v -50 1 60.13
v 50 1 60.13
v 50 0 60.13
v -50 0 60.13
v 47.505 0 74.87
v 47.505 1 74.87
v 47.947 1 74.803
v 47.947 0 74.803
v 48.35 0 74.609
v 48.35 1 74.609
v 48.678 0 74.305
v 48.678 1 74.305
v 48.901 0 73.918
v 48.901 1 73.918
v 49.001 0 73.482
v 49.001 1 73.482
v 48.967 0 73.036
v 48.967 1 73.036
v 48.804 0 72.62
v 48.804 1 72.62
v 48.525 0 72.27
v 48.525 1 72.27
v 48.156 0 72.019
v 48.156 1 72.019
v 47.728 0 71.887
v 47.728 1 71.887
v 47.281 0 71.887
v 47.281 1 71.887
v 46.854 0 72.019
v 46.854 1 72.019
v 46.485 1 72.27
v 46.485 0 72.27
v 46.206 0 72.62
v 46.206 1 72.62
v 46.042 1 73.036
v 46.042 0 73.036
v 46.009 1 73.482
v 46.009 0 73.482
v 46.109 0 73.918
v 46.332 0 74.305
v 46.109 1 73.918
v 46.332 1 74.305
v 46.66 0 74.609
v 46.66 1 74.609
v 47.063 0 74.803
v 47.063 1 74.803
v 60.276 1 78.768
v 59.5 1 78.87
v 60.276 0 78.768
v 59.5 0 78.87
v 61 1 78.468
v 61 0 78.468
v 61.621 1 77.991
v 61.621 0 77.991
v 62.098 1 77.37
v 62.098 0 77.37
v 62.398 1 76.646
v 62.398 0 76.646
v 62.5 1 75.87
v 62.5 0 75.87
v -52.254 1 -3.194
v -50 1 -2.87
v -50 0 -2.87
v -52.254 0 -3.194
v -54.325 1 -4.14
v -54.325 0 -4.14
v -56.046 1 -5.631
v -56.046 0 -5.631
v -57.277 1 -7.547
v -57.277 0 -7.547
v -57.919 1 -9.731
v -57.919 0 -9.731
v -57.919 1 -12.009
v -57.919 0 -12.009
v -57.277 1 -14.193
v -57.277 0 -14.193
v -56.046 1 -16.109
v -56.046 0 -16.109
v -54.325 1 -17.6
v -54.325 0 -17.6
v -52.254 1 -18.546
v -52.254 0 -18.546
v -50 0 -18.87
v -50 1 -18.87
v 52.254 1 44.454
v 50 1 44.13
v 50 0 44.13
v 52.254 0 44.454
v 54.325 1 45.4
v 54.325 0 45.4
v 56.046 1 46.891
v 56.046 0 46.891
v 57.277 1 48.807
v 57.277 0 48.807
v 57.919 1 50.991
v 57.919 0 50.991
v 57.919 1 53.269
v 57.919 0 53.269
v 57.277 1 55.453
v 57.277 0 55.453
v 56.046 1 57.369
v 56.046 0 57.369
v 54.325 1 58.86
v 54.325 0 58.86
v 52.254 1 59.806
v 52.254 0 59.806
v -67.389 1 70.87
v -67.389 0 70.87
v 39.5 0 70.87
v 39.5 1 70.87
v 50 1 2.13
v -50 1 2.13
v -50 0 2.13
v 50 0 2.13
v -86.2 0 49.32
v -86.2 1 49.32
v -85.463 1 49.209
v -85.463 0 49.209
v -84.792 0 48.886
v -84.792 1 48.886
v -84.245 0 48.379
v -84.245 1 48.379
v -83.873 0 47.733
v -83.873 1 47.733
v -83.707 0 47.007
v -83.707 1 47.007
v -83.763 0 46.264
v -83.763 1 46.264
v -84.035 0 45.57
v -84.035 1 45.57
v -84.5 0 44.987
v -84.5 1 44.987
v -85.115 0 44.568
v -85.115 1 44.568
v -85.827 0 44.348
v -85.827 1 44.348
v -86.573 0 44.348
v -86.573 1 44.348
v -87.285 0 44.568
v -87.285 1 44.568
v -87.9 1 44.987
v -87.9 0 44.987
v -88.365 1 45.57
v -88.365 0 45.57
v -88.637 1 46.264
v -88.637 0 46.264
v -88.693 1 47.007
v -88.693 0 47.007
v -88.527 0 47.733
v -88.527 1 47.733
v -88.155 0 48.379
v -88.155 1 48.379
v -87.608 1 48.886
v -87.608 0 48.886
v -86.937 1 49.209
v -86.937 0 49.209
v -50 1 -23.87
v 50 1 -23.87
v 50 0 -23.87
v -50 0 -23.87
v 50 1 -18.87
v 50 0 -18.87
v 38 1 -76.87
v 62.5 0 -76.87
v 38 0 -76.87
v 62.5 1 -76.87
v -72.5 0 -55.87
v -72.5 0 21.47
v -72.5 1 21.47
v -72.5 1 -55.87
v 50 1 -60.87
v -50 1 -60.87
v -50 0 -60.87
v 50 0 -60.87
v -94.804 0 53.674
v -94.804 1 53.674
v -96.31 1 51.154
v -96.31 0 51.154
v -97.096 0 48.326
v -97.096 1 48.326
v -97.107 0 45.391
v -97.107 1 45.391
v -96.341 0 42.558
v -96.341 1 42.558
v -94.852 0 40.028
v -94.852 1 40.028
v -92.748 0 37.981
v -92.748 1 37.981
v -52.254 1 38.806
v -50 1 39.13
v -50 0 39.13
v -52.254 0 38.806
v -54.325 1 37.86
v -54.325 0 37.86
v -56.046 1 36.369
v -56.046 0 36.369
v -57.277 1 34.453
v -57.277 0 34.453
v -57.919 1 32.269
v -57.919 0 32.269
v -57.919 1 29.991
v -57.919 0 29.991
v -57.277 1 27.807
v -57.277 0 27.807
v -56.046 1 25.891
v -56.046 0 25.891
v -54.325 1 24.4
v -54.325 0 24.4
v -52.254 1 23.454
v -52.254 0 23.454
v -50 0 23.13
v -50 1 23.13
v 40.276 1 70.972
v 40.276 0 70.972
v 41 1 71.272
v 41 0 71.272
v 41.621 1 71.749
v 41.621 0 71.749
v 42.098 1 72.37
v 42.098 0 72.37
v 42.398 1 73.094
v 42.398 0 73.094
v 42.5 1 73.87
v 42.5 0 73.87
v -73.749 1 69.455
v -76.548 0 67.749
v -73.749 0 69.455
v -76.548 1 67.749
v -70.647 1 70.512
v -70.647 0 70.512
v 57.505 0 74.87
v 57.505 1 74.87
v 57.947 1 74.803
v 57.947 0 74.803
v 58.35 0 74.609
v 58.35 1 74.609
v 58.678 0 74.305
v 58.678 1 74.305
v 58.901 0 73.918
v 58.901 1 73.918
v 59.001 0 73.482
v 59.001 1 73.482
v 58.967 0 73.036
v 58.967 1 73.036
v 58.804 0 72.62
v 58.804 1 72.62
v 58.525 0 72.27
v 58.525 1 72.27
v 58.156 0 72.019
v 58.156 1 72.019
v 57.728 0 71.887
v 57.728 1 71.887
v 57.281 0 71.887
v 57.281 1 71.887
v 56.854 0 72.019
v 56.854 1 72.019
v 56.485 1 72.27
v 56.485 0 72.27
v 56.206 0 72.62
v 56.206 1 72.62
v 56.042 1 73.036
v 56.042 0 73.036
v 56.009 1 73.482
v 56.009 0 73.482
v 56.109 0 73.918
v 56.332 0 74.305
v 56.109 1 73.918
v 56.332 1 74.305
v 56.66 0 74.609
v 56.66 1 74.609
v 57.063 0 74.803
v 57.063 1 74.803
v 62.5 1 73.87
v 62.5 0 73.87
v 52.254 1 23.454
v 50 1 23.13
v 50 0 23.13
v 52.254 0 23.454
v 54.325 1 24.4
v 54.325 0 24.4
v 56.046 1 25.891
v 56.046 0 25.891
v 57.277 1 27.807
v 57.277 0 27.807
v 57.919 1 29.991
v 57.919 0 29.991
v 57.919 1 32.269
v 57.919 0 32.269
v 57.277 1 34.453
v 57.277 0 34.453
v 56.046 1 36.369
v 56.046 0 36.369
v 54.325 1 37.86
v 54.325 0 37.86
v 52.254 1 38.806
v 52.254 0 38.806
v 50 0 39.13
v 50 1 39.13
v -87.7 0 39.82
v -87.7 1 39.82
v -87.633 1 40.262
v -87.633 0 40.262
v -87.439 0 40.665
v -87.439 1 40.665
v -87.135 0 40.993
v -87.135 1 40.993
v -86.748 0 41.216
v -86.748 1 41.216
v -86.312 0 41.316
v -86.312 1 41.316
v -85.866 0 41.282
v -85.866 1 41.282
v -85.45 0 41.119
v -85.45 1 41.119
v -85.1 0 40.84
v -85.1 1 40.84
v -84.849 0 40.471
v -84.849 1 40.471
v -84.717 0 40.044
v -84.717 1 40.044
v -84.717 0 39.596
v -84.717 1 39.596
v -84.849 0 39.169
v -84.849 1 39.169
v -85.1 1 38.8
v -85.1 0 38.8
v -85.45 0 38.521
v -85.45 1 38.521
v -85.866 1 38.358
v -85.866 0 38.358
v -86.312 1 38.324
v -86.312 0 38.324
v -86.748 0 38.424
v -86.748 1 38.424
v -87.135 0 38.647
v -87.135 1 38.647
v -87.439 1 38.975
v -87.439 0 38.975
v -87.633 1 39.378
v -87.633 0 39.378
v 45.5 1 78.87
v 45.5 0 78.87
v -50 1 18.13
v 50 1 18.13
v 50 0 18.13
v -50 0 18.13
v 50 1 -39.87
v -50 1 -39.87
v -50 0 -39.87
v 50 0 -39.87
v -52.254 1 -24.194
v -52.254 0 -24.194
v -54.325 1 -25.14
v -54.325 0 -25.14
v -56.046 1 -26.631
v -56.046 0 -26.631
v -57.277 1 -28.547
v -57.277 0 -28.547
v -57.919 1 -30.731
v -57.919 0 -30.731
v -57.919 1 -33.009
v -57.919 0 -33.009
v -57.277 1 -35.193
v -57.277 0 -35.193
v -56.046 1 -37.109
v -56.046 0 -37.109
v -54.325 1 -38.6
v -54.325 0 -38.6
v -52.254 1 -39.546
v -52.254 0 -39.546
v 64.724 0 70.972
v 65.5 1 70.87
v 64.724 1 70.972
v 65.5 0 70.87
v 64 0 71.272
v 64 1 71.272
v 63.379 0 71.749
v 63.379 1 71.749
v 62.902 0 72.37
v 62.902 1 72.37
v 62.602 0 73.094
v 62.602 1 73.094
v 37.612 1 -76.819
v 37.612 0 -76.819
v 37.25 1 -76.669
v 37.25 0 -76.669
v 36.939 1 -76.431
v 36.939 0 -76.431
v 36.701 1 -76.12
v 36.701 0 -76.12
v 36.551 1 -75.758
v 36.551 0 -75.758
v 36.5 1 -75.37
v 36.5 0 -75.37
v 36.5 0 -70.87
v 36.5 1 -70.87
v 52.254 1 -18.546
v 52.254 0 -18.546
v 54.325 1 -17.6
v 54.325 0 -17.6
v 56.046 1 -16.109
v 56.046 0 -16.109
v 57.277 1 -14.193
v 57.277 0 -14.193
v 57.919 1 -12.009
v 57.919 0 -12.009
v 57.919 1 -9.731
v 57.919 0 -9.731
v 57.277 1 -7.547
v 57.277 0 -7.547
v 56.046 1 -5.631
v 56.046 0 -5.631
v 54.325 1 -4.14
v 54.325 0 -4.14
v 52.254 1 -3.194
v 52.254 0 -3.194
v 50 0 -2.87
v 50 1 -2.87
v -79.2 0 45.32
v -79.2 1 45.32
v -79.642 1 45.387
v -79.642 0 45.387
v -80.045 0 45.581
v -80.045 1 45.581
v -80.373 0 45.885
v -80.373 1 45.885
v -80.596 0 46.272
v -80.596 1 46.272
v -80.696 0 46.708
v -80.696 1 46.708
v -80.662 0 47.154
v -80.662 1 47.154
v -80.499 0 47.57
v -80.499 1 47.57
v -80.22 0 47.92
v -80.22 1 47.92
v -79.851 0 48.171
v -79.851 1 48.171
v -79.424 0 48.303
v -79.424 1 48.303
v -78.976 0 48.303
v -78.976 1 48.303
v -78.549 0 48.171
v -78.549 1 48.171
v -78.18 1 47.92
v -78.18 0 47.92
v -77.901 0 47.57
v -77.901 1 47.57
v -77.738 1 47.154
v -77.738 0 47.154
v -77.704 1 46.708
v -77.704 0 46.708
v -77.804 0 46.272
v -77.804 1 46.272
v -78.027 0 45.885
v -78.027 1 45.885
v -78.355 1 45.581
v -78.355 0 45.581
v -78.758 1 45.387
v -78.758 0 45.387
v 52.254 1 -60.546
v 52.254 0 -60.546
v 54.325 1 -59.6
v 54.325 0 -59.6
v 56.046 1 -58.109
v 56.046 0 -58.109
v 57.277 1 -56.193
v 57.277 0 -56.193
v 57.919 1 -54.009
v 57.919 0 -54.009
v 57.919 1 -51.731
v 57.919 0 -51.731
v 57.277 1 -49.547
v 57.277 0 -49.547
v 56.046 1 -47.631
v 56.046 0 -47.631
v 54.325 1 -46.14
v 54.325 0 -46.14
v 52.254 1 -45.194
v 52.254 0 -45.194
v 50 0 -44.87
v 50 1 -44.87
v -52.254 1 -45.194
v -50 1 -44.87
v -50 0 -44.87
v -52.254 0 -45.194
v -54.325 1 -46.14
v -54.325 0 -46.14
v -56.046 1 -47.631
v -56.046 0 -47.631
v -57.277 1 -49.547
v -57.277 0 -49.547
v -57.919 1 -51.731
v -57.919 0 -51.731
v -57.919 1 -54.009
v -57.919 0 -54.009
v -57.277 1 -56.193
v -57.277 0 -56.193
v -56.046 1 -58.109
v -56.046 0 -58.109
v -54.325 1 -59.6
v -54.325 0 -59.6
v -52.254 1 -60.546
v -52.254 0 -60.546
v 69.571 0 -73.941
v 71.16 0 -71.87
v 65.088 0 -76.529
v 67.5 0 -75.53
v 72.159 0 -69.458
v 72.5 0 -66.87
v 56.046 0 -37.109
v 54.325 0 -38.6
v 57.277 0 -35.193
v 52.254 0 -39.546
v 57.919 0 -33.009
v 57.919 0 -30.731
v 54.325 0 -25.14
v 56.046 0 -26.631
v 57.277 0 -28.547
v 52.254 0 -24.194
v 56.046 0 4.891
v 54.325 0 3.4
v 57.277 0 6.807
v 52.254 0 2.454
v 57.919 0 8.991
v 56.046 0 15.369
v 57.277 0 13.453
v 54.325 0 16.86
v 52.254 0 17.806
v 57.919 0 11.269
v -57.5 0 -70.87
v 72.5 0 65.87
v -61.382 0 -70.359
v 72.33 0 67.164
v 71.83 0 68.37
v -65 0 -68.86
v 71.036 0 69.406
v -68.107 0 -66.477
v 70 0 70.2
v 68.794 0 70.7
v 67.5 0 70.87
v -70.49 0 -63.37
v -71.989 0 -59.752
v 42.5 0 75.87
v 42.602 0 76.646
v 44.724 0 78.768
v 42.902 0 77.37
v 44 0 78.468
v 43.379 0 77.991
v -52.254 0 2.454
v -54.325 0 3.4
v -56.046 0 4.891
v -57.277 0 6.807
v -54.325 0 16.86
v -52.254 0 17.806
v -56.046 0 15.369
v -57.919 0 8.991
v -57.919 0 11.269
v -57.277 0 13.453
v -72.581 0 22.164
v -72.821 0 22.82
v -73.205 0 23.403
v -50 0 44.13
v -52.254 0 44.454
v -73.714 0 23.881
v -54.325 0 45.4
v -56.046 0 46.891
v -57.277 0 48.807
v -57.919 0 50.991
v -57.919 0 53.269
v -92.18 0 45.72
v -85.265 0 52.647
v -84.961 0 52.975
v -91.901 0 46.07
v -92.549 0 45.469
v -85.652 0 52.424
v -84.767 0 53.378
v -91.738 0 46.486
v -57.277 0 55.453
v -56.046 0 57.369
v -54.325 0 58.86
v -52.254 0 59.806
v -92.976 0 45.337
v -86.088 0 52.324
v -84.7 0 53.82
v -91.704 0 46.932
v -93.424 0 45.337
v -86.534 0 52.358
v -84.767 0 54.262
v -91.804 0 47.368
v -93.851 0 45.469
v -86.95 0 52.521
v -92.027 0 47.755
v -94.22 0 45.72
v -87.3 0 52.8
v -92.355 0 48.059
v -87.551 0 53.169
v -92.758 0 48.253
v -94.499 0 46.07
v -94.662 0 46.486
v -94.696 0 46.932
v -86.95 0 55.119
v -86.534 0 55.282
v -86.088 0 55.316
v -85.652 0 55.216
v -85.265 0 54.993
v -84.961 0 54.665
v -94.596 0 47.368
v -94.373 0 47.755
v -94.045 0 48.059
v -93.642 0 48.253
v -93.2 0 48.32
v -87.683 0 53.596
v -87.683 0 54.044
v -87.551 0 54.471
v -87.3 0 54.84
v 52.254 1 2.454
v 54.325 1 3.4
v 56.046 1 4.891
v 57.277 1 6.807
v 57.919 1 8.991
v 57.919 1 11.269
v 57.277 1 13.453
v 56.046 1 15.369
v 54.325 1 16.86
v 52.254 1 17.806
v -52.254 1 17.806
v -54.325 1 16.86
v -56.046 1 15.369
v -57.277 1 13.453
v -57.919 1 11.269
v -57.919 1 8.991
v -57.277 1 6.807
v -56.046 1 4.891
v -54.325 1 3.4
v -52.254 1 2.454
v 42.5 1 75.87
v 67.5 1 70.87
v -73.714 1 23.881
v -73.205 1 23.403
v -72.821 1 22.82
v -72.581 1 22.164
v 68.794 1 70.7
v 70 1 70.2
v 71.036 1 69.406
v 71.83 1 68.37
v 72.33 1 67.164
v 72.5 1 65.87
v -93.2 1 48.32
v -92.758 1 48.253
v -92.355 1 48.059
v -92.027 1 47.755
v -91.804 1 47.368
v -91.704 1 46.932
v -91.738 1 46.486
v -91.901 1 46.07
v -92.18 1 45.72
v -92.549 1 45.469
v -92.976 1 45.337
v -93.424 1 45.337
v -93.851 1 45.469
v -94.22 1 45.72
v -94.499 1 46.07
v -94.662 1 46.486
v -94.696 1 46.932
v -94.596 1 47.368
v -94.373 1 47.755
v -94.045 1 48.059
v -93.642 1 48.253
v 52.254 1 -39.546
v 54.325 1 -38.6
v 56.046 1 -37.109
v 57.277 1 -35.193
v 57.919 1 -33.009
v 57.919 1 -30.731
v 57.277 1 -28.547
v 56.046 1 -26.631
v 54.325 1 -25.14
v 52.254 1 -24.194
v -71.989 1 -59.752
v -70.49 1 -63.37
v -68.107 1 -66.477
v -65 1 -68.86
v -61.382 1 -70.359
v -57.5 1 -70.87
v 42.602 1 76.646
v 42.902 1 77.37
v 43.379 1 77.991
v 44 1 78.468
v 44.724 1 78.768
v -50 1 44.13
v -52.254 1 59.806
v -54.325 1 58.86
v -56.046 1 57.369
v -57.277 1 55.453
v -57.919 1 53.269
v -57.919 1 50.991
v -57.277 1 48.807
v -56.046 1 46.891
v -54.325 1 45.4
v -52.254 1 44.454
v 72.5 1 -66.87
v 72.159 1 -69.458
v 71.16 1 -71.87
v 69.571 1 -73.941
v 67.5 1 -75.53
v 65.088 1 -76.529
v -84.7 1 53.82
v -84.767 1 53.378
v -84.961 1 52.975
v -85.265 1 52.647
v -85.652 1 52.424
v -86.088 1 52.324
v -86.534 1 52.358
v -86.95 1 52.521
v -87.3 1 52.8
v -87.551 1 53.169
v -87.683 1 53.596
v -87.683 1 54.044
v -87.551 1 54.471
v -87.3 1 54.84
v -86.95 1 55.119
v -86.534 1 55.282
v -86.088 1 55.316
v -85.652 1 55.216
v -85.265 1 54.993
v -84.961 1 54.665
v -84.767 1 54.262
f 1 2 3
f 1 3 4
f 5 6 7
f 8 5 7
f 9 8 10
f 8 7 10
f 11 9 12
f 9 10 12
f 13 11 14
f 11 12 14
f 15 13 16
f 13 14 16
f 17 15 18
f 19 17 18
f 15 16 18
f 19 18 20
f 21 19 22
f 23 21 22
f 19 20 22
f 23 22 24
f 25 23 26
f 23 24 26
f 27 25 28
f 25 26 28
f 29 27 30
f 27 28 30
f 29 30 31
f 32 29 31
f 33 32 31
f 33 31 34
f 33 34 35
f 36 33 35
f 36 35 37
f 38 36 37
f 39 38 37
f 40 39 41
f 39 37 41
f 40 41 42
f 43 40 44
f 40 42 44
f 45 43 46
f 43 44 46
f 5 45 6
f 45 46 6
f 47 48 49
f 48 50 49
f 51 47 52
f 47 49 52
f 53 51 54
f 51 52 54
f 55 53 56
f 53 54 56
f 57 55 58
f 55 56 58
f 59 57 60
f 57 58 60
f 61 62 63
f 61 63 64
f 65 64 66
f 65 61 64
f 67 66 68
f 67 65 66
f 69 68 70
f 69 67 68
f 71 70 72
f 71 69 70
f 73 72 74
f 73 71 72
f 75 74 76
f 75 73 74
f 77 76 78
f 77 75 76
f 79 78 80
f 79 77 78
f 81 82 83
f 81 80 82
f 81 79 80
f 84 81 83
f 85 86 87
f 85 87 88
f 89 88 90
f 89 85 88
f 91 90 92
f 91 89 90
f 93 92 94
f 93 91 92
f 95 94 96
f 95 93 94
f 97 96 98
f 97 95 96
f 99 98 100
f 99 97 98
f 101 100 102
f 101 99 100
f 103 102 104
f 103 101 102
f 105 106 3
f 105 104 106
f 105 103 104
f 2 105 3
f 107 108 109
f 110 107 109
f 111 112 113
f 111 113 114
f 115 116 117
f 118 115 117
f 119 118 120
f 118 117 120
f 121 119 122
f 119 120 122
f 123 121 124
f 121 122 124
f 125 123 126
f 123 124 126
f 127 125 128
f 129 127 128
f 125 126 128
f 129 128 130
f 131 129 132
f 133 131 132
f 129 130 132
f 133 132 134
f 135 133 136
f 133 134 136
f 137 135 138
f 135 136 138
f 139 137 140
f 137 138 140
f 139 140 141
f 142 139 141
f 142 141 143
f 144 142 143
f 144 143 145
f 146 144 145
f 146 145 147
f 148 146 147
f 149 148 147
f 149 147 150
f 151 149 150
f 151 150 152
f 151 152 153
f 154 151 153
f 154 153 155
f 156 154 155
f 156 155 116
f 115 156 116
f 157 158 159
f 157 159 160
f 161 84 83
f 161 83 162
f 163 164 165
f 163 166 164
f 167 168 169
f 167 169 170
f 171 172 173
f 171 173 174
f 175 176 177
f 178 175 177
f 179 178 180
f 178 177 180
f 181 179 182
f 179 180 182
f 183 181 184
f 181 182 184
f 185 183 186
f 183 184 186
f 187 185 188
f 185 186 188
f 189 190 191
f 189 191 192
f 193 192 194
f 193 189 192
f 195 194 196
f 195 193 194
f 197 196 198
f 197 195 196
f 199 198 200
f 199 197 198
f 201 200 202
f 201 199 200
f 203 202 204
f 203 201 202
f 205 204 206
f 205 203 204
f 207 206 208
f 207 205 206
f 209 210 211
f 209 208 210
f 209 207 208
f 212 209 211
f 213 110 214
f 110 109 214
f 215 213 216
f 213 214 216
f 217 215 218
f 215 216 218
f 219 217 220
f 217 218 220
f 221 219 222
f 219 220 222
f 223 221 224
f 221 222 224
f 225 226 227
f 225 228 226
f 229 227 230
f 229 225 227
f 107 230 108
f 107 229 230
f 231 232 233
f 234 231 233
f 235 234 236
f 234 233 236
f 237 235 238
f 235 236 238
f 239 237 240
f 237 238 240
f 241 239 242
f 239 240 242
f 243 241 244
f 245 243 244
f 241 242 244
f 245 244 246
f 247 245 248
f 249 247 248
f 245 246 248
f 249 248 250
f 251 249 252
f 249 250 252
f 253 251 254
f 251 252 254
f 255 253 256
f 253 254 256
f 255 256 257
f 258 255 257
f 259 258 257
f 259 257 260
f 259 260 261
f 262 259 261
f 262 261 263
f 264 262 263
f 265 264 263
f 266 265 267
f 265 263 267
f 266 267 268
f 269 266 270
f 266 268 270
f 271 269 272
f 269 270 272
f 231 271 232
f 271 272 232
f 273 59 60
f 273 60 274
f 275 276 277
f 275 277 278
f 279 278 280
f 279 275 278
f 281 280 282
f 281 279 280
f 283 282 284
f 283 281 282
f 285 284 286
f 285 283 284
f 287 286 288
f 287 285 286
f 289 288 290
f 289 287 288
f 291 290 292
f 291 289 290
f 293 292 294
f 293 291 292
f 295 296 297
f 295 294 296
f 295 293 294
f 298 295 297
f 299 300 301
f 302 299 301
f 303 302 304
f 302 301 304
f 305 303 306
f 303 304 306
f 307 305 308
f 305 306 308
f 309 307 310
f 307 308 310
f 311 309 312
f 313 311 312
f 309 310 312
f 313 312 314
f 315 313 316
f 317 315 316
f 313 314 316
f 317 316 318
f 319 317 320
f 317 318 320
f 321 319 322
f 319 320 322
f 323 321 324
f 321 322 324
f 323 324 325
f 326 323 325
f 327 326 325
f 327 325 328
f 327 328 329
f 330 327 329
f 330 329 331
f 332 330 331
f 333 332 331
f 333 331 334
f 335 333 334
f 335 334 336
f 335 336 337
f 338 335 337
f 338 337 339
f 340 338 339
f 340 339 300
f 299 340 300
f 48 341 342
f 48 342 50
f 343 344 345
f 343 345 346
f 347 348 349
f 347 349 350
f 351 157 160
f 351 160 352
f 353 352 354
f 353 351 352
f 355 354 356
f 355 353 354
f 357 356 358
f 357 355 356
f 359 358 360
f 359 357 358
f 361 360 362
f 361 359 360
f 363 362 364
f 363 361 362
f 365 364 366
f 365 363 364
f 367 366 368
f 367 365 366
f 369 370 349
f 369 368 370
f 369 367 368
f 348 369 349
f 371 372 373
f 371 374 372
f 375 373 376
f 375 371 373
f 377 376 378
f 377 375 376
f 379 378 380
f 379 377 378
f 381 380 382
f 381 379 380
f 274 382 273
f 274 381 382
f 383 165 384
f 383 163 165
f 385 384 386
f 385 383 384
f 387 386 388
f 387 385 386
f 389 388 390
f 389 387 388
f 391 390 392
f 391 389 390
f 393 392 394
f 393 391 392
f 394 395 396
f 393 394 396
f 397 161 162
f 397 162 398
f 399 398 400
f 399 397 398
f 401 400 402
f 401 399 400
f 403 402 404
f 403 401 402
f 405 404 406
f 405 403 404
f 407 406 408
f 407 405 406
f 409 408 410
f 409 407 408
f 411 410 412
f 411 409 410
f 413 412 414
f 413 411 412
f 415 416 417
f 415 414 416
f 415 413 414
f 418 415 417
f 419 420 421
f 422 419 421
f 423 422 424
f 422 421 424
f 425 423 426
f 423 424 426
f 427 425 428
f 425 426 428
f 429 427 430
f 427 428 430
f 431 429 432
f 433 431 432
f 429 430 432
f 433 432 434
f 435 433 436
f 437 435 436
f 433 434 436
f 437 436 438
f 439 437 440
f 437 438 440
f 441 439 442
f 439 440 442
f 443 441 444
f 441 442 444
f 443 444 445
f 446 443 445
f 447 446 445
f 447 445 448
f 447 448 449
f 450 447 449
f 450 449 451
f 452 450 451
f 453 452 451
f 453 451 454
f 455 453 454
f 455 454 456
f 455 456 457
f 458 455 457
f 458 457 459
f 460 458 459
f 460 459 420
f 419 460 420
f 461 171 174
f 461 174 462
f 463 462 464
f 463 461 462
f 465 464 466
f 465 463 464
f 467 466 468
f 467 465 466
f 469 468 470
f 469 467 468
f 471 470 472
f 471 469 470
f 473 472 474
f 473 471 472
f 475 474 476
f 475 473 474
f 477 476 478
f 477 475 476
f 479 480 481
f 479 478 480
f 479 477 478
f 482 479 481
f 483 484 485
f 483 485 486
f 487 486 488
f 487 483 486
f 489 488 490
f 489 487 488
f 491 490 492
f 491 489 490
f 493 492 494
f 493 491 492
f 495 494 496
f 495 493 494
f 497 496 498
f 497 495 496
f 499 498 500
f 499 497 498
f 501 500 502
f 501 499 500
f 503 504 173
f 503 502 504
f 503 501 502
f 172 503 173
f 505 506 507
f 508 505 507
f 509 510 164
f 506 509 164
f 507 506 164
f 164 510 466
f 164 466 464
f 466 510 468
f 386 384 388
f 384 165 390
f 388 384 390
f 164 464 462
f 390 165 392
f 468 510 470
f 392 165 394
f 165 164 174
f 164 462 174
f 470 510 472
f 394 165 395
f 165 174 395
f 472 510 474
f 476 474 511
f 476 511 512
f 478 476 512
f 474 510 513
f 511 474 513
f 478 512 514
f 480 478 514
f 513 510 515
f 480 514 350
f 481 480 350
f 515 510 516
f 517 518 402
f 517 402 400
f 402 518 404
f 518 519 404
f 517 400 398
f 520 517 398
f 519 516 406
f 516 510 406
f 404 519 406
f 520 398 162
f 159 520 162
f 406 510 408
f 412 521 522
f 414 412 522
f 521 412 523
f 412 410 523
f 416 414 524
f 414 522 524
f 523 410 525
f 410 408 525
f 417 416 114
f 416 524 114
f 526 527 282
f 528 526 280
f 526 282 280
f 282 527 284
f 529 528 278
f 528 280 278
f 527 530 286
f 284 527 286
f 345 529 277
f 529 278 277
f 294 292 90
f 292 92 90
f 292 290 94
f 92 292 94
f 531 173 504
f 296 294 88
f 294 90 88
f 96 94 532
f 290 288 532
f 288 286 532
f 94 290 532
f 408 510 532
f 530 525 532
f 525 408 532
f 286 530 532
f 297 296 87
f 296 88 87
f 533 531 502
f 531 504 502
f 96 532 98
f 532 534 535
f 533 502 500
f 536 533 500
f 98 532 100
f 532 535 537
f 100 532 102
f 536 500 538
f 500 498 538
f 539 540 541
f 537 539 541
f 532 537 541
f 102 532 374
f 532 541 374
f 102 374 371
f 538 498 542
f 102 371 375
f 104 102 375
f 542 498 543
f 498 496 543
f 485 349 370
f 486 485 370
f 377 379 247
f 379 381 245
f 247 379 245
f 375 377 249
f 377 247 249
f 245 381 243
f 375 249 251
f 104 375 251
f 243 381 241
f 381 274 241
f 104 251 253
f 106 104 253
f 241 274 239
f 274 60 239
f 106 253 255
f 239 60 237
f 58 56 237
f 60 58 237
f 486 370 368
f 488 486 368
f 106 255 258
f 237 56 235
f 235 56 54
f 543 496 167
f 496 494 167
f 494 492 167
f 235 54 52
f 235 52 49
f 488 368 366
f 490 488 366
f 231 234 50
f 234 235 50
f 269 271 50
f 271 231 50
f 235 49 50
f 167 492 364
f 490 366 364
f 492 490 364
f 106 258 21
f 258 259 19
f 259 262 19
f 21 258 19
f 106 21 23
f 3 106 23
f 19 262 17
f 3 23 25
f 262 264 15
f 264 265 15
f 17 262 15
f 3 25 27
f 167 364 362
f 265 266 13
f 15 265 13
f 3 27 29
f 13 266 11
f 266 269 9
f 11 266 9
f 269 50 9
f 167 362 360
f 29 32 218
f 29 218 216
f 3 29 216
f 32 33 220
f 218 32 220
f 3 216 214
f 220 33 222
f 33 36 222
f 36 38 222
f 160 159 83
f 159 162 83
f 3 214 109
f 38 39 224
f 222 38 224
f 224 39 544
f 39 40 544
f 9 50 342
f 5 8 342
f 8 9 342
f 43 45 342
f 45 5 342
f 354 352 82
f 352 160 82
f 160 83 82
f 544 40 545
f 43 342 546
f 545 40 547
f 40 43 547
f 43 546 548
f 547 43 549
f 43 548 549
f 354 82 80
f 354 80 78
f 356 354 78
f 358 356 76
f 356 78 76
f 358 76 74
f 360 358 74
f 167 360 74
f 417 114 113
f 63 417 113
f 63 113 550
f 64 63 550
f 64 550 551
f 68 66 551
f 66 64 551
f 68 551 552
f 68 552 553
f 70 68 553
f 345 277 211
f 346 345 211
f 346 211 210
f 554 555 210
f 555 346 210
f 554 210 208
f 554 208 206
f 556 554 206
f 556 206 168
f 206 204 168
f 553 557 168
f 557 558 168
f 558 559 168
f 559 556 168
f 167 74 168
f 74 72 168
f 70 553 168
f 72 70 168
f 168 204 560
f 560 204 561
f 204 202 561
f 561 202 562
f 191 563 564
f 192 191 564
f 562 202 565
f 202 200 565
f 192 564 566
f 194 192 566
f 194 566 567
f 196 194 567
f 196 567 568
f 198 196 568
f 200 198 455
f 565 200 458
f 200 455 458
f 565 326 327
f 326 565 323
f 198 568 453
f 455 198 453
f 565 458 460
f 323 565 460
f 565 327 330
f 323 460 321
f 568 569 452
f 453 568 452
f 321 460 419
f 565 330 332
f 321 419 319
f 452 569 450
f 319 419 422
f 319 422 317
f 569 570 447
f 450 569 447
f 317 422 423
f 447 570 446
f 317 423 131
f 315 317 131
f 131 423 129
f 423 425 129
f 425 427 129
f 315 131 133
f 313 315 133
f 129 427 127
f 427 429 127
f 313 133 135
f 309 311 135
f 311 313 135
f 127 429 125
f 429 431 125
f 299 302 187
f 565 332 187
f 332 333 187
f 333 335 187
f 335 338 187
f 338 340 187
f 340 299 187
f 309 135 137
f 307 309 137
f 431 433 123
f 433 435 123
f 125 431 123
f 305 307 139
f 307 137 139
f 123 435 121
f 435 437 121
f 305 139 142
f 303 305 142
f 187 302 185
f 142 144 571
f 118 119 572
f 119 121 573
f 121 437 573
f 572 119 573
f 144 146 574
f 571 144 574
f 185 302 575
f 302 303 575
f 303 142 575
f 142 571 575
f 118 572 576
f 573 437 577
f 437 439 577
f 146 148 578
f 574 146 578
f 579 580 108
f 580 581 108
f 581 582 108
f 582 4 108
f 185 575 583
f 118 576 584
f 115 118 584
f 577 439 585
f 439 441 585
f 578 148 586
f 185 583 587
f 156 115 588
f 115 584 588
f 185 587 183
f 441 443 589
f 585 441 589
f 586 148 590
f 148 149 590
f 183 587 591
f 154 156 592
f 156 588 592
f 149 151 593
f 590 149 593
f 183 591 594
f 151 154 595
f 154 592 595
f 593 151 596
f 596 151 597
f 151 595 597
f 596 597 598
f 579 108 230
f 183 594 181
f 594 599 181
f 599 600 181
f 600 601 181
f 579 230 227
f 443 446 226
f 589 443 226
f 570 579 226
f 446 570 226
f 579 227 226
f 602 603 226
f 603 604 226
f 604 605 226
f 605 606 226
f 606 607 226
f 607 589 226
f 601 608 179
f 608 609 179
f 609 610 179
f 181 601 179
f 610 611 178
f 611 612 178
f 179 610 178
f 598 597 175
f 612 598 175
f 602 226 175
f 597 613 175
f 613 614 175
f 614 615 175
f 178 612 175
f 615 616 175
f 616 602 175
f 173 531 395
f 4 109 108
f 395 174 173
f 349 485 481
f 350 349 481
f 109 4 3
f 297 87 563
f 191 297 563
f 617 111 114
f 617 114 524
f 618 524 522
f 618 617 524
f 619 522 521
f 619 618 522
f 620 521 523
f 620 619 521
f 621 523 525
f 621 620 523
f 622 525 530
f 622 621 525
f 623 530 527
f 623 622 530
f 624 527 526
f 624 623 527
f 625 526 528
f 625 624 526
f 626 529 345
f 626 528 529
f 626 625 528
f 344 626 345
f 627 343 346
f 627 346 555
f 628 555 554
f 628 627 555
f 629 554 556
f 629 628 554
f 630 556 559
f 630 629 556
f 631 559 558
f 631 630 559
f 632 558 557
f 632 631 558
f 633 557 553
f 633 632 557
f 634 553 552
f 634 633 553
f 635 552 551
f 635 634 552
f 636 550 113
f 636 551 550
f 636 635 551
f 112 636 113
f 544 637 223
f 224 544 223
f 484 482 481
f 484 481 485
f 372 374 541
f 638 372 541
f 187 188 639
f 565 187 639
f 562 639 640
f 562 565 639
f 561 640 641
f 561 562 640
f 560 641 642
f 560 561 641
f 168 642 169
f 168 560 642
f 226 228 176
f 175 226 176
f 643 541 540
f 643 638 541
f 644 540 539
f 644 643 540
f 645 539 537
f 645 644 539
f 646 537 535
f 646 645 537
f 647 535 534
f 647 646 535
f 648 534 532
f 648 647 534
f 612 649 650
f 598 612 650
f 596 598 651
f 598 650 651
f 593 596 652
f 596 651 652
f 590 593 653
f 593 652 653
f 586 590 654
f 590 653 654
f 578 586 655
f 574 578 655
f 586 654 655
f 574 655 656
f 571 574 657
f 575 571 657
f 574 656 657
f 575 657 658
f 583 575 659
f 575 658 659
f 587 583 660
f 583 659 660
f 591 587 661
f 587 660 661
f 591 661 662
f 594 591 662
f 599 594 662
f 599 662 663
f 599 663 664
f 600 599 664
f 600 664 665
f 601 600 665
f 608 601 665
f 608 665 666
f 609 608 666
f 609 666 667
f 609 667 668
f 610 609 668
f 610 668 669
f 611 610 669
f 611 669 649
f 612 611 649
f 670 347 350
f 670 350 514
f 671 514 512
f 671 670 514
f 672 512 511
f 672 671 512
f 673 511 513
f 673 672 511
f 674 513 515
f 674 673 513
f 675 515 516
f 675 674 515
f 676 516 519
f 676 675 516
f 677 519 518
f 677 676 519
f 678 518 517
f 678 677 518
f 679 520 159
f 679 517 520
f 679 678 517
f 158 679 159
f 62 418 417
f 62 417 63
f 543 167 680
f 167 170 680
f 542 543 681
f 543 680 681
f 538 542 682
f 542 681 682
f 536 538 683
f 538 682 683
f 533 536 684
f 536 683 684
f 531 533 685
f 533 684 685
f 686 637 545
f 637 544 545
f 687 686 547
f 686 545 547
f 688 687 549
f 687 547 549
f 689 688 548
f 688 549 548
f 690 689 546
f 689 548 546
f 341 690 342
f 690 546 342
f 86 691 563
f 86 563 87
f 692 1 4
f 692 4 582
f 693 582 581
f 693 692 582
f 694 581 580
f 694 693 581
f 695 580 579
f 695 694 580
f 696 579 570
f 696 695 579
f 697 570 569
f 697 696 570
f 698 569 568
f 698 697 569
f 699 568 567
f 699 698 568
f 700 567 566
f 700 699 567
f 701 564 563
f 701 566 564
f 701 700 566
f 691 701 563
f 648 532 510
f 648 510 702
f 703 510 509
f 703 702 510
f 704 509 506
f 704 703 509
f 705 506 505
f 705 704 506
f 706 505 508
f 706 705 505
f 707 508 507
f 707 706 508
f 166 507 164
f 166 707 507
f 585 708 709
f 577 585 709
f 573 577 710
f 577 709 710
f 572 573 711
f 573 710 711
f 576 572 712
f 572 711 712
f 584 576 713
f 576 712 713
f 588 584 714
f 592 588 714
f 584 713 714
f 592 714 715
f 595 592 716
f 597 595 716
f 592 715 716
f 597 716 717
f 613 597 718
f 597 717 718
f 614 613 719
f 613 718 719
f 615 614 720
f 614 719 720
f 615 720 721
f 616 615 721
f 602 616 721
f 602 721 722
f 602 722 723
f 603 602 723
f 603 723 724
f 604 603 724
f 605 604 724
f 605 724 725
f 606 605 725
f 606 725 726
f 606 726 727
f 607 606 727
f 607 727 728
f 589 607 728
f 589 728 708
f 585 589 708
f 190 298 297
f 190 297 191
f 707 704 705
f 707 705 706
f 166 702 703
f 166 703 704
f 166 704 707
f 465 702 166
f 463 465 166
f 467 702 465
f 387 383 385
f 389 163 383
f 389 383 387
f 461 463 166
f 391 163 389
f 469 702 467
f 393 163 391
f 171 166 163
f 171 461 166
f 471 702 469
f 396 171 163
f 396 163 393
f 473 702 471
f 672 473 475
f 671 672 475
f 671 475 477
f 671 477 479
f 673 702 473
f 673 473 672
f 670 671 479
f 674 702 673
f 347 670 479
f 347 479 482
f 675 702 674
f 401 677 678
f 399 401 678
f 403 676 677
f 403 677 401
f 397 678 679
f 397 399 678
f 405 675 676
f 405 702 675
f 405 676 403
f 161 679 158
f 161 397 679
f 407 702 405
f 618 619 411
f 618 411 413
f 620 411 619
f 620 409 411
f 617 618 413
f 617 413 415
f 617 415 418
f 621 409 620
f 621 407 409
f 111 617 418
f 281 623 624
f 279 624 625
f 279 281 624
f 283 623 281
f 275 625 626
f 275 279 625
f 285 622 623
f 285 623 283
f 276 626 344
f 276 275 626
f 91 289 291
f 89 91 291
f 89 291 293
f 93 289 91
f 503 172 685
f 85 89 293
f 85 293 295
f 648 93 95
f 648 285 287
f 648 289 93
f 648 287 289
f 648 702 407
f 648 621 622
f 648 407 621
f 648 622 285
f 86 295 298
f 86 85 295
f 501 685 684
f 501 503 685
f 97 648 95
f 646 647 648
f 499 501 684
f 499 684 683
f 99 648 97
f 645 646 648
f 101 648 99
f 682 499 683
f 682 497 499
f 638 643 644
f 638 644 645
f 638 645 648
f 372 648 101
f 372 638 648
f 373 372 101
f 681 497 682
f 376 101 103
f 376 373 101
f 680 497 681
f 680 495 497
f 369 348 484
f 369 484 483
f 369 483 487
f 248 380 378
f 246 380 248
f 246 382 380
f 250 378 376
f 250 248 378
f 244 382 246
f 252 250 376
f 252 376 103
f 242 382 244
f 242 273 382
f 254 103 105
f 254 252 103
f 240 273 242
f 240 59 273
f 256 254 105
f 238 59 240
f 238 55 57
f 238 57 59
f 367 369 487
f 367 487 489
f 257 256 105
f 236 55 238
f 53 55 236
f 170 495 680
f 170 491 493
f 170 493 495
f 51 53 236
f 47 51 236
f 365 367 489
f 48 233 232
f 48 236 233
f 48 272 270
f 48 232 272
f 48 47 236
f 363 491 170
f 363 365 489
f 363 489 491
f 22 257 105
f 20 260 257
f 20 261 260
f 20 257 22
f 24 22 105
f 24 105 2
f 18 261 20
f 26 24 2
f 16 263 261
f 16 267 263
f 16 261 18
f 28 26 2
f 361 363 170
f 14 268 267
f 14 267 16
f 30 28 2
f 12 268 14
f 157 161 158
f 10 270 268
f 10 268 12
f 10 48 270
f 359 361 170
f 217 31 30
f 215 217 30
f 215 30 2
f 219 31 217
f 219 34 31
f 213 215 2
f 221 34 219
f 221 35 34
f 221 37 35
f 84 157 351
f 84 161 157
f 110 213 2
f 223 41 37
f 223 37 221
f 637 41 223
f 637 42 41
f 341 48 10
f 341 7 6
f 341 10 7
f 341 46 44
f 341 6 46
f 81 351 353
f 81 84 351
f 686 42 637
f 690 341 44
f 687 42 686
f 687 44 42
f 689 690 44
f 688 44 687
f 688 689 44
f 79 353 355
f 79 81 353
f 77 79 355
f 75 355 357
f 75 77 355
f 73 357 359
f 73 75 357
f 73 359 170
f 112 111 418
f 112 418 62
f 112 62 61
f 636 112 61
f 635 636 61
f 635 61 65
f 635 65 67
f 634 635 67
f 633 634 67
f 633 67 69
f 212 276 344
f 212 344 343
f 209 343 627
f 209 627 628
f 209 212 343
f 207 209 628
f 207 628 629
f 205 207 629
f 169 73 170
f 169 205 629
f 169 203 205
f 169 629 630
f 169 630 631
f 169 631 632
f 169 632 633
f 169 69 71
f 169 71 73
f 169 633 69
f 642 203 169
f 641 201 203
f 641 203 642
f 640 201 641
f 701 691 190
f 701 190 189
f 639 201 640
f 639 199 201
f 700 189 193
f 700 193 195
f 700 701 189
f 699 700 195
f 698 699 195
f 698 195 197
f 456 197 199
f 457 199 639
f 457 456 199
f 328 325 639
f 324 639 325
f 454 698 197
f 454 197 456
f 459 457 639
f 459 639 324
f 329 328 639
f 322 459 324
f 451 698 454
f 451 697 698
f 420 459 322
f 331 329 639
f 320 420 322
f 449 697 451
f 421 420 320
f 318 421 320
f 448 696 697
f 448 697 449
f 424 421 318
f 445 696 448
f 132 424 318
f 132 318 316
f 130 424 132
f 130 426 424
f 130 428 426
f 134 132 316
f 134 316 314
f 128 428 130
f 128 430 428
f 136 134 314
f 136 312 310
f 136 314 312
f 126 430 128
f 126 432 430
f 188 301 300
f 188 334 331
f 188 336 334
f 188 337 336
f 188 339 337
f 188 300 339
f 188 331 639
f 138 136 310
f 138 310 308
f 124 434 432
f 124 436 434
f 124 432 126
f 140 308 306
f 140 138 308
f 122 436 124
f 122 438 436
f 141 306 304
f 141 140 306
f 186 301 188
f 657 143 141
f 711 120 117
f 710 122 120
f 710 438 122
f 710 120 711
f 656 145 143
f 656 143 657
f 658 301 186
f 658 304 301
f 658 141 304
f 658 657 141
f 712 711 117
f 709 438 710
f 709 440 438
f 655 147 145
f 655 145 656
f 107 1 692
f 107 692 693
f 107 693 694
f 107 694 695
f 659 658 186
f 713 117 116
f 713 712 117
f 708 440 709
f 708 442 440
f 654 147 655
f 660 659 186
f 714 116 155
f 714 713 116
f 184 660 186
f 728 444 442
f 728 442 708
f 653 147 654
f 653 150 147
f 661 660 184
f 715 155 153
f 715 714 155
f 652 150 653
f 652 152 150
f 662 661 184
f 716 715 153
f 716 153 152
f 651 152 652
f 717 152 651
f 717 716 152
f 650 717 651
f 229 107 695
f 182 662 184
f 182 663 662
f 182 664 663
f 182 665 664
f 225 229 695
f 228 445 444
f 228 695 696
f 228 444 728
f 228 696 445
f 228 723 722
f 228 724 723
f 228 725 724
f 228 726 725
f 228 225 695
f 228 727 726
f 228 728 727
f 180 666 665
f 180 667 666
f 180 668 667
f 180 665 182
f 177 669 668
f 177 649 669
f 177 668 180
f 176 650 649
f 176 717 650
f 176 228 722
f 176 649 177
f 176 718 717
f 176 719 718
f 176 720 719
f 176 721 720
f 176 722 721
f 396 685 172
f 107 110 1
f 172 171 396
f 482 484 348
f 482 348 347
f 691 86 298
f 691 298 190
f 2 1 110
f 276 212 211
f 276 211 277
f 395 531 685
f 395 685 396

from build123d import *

# Parameters (mm, degrees)
SKETCH_1_W               = 145
SKETCH_1_H               = 141.74
EXTRUDE_1_DEPTH          = 1
FILLET_1_R               = 15
EXTRUDE_2_DEPTH          = 1
SKETCH_3_R               = 2.5
SKETCH_3_R_2             = 1.5
CUT_EXTRUDE_1_DEPTH      = 127.962285976
PATTERN_CIRCULAR_1_COUNT = 4
CUT_EXTRUDE_2_DEPTH      = 127.962285976
FILLET_2_R               = 15
FILLET_3_R               = 3
CUT_EXTRUDE_3_DEPTH      = 121.297119251
SKETCH_6_W               = 36
SKETCH_6_H               = 1
EXTRUDE_3_DEPTH          = 6
FILLET_4_R               = 10
FILLET_5_R               = 1.5
SKETCH_8_W               = 20
SKETCH_8_H               = 8
SKETCH_8_R               = 1.5
EXTRUDE_5_DEPTH          = 1
FILLET_8_R               = 3
FILLET_9_R               = 5


with BuildPart() as part:
    # 草图1 → 凸台-拉伸1 (new body)
    with BuildSketch(Plane(origin=(0, 0, 0), x_dir=(1, 0, 0), z_dir=(0, 1, 0))):
        Rectangle(SKETCH_1_W, SKETCH_1_H)
    extrude(amount=EXTRUDE_1_DEPTH)

    # 圆角1
    fillet_1_edges = [part.edges().sort_by_distance(p)[0] for p in [
        (-72.5, 0.5, -70.87),
    ]]
    fillet(fillet_1_edges, radius=FILLET_1_R)

    # 草图2 → 凸台-拉伸2 (add)
    with BuildSketch(Plane(origin=(0, 1, 0), x_dir=(1, 0, 0), z_dir=(0, 1, 0))):
        with BuildLine():
            Line((-92.747934341, -37.981190359), (-72.5, -22.981190359))
            Line((-72.5, -22.981190359), (-72.5, -81.673631364))
            Line((-72.5, -81.673631364), (-94.803937304, -53.673631364))
            ThreePointArc((-94.803937304, -53.673631364), (-97.10678595, -45.391007263), (-92.747934341, -37.981190359))
        make_face()
    extrude(amount=-EXTRUDE_2_DEPTH)

    # 草图3 → 切除-拉伸1 (cut, through all)
    with BuildSketch(Plane(origin=(0, 1, 0), x_dir=(1, 0, 0), z_dir=(0, 1, 0))):
        with Locations(Location((-86.2, -46.82, 0), (0, 0, 270))):
            Circle(SKETCH_3_R)
        with Locations(Location((-93.2, -46.82, 0), (0, 0, 270))):
            Circle(SKETCH_3_R_2)
    cut_extrude_1 = extrude(amount=-CUT_EXTRUDE_1_DEPTH, mode=Mode.SUBTRACT)

    # 阵列(圆周)1: 切除-拉伸1 ×4 about axis
    pattern_circular_1_axis = Axis((-86.2, 0, 46.82), (0, 1, 0))
    for i in range(1, PATTERN_CIRCULAR_1_COUNT):
        add(cut_extrude_1.rotate(pattern_circular_1_axis, i * 360 / PATTERN_CIRCULAR_1_COUNT), mode=Mode.SUBTRACT)

    # 草图4 → 切除-拉伸2 (cut, through all)
    with BuildSketch(Plane(origin=(0, 1, 0), x_dir=(1, 0, 0), z_dir=(0, 1, 0))):
        Polygon((-72.5, -70.87), (-94.803937304, -53.673631364), (-72.5, -88.862813476), align=None)
    extrude(amount=-CUT_EXTRUDE_2_DEPTH, mode=Mode.SUBTRACT)

    # 圆角2
    fillet_2_edges = [part.edges().sort_by_distance(p)[0] for p in [
        (-72.5, 0.5, 70.87),
    ]]
    fillet(fillet_2_edges, radius=FILLET_2_R)

    # 圆角3
    fillet_3_edges = [part.edges().sort_by_distance(p)[0] for p in [
        (-72.5, 0.5, 22.981190359),
    ]]
    fillet(fillet_3_edges, radius=FILLET_3_R)

    # 草图5 → 切除-拉伸3 (cut, through all)
    with BuildSketch(Plane(origin=(0, 1, 0), x_dir=(1, 0, 0), z_dir=(0, 1, 0))):
        with BuildLine():
            Line((-50, 60.87), (50, 60.87))
            ThreePointArc((50, 60.87), (58, 52.87), (50, 44.87))
            Line((50, 44.87), (-50, 44.87))
            ThreePointArc((-50, 44.87), (-58, 52.87), (-50, 60.87))
        make_face()
        with BuildLine():
            Line((-50, 39.87), (50, 39.87))
            ThreePointArc((50, 39.87), (58, 31.87), (50, 23.87))
            Line((50, 23.87), (-50, 23.87))
            ThreePointArc((-50, 23.87), (-58, 31.87), (-50, 39.87))
        make_face()
        with BuildLine():
            Line((-50, 18.87), (50, 18.87))
            ThreePointArc((50, 18.87), (58, 10.87), (50, 2.87))
            Line((50, 2.87), (-50, 2.87))
            ThreePointArc((-50, 2.87), (-58, 10.87), (-50, 18.87))
        make_face()
        with BuildLine():
            Line((-50, -2.13), (50, -2.13))
            ThreePointArc((50, -2.13), (58, -10.13), (50, -18.13))
            Line((50, -18.13), (-50, -18.13))
            ThreePointArc((-50, -18.13), (-58, -10.13), (-50, -2.13))
        make_face()
        with BuildLine():
            Line((-50, -23.13), (50, -23.13))
            ThreePointArc((50, -23.13), (58, -31.13), (50, -39.13))
            Line((50, -39.13), (-50, -39.13))
            ThreePointArc((-50, -39.13), (-58, -31.13), (-50, -23.13))
        make_face()
        with BuildLine():
            Line((-50, -44.13), (50, -44.13))
            ThreePointArc((50, -44.13), (58, -52.13), (50, -60.13))
            Line((50, -60.13), (-50, -60.13))
            ThreePointArc((-50, -60.13), (-58, -52.13), (-50, -44.13))
        make_face()
    extrude(amount=-CUT_EXTRUDE_3_DEPTH, mode=Mode.SUBTRACT)

    # 草图6 → 凸台-拉伸3 (add)
    with BuildSketch(Plane(origin=(0, 0, -70.87), x_dir=(-1, 0, 0), z_dir=(0, 0, -1))):
        with Locations((-54.5, 0.5)):
            Rectangle(SKETCH_6_W, SKETCH_6_H)
    extrude(amount=EXTRUDE_3_DEPTH)

    # 圆角4
    fillet_4_edges = [part.edges().sort_by_distance(p)[0] for p in [
        (72.5, 0.5, -76.87),
    ]]
    fillet(fillet_4_edges, radius=FILLET_4_R)

    # 圆角5
    fillet_5_edges = [part.edges().sort_by_distance(p)[0] for p in [
        (36.5, 0.5, -76.87),
    ]]
    fillet(fillet_5_edges, radius=FILLET_5_R)

    # 草图8 → 凸台-拉伸5 (add)
    with BuildSketch(Plane(origin=(0, 1, 0), x_dir=(1, 0, 0), z_dir=(0, 1, 0))):
        with Locations((52.5, -74.87)):
            Rectangle(SKETCH_8_W, SKETCH_8_H)
        with Locations(Location((47.504832843, -73.37, 0), (0, 0, 270))):
            Circle(SKETCH_8_R, mode=Mode.SUBTRACT)
        with Locations(Location((57.504832843, -73.37, 0), (0, 0, 270))):
            Circle(SKETCH_8_R, mode=Mode.SUBTRACT)
    extrude(amount=-EXTRUDE_5_DEPTH)

    # 圆角8
    fillet_8_edges = [part.edges().sort_by_distance(p)[0] for p in [
        (62.5, 0.5, 70.87),
        (62.5, 0.5, 78.87),
        (42.5, 0.5, 78.87),
        (42.5, 0.5, 70.87),
    ]]
    fillet(fillet_8_edges, radius=FILLET_8_R)

    # 圆角9
    fillet_9_edges = [part.edges().sort_by_distance(p)[0] for p in [
        (72.5, 0.5, 70.87),
    ]]
    fillet(fillet_9_edges, radius=FILLET_9_R)


solid = part.part
